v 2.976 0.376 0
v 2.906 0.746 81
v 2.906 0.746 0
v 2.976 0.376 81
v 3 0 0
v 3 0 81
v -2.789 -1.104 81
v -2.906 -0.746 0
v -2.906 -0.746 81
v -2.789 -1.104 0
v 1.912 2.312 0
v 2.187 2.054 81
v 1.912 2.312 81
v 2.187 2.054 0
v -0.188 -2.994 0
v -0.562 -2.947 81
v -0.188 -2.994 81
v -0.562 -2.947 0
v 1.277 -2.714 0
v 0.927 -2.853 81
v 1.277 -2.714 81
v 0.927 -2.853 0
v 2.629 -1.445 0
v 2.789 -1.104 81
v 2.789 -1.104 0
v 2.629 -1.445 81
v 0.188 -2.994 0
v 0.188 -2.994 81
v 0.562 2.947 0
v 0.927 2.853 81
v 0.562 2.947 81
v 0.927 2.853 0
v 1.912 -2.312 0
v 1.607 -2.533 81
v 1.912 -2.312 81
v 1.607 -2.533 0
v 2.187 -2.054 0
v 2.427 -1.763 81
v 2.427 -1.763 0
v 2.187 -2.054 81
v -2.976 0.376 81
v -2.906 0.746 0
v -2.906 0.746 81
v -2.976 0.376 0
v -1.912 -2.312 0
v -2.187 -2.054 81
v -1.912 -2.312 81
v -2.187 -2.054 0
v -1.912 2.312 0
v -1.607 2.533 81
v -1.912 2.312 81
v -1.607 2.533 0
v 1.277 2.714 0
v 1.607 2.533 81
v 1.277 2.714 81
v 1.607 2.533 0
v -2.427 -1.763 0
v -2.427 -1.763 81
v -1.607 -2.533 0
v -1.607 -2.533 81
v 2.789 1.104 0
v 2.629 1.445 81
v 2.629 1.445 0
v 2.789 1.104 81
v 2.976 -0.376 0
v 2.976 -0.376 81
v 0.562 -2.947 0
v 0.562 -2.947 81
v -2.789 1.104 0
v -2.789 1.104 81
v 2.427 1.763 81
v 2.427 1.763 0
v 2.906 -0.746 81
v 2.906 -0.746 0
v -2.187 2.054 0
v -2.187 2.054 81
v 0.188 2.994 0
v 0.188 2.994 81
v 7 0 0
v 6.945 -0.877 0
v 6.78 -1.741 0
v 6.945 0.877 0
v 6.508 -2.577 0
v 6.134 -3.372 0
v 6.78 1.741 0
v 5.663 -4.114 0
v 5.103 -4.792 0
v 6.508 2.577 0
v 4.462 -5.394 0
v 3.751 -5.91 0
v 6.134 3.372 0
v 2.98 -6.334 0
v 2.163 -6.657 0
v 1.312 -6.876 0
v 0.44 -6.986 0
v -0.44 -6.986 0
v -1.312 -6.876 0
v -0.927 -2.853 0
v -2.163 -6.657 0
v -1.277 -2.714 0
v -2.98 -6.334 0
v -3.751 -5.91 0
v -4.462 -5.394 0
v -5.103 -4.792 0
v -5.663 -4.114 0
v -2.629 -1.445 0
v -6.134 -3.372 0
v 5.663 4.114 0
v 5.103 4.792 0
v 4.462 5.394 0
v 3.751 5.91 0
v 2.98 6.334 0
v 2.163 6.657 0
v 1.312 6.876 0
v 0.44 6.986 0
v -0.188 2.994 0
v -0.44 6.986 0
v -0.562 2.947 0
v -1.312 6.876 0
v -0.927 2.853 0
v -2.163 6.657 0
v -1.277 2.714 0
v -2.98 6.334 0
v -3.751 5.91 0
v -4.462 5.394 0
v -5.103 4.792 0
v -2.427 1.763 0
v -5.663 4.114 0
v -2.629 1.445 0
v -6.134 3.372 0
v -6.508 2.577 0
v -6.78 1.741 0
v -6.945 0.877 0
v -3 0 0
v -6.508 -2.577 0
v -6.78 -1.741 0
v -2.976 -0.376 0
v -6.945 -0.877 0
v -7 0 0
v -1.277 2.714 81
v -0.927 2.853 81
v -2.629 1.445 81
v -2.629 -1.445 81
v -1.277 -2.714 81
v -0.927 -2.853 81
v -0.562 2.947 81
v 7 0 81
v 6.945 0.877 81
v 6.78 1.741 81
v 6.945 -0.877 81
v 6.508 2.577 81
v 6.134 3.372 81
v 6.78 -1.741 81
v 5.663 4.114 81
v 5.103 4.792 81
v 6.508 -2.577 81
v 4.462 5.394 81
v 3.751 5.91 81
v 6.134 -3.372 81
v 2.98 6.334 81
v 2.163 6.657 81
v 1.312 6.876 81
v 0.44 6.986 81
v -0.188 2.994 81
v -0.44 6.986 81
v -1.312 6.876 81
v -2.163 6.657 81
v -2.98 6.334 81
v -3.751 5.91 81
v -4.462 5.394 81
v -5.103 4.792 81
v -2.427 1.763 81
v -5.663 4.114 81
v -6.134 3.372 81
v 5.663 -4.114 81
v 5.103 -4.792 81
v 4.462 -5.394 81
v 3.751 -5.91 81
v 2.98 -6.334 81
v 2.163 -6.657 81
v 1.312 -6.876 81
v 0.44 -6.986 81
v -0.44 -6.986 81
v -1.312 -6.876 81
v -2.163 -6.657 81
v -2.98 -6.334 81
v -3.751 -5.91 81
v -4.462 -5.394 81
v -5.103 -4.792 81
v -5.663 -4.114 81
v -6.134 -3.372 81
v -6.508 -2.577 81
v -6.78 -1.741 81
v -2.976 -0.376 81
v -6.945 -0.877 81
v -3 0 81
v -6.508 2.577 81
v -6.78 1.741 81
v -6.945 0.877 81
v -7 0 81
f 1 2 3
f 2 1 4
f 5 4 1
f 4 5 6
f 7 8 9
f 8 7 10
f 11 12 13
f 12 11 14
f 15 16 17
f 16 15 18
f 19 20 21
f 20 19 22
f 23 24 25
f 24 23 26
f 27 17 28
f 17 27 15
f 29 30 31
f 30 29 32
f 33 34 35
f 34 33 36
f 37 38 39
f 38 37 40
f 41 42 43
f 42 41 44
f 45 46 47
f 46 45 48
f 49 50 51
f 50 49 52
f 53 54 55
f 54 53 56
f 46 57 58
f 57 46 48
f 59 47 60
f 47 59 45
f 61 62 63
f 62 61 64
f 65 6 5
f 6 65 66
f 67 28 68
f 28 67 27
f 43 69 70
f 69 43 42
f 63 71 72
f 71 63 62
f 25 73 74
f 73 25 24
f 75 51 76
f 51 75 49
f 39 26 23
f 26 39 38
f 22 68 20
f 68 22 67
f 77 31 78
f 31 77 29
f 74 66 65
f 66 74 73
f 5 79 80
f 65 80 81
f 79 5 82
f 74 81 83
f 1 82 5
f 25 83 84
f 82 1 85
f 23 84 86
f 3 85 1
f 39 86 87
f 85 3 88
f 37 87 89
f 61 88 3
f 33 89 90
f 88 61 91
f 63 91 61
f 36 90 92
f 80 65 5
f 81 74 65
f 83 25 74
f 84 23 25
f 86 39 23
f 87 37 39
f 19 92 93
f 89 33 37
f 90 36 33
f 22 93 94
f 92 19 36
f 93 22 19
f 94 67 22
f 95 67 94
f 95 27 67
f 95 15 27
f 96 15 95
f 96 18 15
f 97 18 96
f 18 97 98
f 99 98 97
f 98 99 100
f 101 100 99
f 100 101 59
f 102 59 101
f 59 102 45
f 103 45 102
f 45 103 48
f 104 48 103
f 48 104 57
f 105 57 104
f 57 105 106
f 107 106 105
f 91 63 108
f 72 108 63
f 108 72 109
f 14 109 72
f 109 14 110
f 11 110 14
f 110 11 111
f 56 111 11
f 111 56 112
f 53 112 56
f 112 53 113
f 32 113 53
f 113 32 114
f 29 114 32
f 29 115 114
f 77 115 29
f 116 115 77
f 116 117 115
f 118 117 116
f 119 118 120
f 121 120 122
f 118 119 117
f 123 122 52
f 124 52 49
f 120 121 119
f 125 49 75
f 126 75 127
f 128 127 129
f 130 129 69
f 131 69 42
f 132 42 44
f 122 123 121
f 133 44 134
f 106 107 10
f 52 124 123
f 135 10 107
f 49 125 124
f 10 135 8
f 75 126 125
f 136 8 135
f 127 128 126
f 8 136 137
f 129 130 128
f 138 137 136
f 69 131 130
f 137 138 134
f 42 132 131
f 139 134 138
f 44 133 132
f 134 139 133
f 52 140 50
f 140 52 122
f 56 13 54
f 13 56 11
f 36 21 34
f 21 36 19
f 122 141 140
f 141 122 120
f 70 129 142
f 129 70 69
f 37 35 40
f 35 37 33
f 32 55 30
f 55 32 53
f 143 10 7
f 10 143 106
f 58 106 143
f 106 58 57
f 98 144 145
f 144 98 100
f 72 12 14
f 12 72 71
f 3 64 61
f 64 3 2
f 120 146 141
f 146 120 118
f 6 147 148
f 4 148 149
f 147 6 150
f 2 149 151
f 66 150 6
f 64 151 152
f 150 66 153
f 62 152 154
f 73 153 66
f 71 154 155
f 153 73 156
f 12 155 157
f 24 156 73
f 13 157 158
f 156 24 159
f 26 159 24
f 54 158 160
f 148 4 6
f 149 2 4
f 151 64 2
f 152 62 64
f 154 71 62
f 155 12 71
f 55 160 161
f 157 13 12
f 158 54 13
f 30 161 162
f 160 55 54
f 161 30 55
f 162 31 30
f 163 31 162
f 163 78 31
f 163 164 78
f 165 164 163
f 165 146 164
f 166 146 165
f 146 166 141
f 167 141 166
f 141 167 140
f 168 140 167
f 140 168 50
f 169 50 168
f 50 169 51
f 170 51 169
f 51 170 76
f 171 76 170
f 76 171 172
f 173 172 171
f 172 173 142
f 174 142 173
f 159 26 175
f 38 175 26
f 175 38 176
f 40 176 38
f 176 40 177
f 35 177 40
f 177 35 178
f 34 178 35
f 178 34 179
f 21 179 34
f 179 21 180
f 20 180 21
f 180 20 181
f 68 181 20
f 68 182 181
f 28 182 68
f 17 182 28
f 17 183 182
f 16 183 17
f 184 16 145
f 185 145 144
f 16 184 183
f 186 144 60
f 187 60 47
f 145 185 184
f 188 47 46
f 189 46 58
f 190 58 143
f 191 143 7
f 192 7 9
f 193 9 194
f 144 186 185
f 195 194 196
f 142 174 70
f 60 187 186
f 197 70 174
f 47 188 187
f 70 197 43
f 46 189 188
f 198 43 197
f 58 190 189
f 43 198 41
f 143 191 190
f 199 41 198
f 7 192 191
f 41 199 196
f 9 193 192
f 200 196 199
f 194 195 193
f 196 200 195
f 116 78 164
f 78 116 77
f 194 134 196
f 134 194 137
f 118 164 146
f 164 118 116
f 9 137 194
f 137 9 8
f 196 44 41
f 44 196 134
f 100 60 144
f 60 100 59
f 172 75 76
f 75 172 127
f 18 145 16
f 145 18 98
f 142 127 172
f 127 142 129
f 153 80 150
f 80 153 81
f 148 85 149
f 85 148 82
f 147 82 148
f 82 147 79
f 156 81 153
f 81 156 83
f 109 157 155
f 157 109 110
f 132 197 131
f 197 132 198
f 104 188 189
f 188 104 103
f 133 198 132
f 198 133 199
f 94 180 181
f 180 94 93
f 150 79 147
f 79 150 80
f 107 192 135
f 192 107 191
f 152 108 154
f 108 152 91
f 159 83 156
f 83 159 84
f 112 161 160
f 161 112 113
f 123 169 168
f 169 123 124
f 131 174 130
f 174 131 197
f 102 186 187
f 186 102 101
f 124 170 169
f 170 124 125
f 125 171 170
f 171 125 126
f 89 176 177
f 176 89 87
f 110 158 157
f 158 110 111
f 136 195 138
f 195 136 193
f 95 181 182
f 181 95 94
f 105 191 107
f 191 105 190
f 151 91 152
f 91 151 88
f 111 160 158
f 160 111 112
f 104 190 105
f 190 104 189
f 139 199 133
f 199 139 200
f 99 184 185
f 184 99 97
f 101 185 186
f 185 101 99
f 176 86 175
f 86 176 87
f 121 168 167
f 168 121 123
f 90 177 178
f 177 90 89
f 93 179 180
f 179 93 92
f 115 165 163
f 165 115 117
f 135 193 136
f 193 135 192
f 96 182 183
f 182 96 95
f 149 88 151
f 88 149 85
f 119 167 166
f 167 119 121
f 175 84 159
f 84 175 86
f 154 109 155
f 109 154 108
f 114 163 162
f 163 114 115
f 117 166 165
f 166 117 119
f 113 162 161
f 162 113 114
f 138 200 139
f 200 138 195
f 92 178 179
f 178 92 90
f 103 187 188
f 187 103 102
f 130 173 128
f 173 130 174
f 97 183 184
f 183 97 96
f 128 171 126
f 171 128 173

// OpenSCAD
$fn = 50;


difference() {
	union() {
		cylinder(h = 81, r = 7.0000000000);
	}
	union() {
		cylinder(h = 81, r = 3.0000000000);
		cylinder(h = 81, r = 1.5000000000);
		cylinder(h = 81, r = 1.5000000000);
		cylinder(h = 81, r = 1.5000000000);
	}
}
